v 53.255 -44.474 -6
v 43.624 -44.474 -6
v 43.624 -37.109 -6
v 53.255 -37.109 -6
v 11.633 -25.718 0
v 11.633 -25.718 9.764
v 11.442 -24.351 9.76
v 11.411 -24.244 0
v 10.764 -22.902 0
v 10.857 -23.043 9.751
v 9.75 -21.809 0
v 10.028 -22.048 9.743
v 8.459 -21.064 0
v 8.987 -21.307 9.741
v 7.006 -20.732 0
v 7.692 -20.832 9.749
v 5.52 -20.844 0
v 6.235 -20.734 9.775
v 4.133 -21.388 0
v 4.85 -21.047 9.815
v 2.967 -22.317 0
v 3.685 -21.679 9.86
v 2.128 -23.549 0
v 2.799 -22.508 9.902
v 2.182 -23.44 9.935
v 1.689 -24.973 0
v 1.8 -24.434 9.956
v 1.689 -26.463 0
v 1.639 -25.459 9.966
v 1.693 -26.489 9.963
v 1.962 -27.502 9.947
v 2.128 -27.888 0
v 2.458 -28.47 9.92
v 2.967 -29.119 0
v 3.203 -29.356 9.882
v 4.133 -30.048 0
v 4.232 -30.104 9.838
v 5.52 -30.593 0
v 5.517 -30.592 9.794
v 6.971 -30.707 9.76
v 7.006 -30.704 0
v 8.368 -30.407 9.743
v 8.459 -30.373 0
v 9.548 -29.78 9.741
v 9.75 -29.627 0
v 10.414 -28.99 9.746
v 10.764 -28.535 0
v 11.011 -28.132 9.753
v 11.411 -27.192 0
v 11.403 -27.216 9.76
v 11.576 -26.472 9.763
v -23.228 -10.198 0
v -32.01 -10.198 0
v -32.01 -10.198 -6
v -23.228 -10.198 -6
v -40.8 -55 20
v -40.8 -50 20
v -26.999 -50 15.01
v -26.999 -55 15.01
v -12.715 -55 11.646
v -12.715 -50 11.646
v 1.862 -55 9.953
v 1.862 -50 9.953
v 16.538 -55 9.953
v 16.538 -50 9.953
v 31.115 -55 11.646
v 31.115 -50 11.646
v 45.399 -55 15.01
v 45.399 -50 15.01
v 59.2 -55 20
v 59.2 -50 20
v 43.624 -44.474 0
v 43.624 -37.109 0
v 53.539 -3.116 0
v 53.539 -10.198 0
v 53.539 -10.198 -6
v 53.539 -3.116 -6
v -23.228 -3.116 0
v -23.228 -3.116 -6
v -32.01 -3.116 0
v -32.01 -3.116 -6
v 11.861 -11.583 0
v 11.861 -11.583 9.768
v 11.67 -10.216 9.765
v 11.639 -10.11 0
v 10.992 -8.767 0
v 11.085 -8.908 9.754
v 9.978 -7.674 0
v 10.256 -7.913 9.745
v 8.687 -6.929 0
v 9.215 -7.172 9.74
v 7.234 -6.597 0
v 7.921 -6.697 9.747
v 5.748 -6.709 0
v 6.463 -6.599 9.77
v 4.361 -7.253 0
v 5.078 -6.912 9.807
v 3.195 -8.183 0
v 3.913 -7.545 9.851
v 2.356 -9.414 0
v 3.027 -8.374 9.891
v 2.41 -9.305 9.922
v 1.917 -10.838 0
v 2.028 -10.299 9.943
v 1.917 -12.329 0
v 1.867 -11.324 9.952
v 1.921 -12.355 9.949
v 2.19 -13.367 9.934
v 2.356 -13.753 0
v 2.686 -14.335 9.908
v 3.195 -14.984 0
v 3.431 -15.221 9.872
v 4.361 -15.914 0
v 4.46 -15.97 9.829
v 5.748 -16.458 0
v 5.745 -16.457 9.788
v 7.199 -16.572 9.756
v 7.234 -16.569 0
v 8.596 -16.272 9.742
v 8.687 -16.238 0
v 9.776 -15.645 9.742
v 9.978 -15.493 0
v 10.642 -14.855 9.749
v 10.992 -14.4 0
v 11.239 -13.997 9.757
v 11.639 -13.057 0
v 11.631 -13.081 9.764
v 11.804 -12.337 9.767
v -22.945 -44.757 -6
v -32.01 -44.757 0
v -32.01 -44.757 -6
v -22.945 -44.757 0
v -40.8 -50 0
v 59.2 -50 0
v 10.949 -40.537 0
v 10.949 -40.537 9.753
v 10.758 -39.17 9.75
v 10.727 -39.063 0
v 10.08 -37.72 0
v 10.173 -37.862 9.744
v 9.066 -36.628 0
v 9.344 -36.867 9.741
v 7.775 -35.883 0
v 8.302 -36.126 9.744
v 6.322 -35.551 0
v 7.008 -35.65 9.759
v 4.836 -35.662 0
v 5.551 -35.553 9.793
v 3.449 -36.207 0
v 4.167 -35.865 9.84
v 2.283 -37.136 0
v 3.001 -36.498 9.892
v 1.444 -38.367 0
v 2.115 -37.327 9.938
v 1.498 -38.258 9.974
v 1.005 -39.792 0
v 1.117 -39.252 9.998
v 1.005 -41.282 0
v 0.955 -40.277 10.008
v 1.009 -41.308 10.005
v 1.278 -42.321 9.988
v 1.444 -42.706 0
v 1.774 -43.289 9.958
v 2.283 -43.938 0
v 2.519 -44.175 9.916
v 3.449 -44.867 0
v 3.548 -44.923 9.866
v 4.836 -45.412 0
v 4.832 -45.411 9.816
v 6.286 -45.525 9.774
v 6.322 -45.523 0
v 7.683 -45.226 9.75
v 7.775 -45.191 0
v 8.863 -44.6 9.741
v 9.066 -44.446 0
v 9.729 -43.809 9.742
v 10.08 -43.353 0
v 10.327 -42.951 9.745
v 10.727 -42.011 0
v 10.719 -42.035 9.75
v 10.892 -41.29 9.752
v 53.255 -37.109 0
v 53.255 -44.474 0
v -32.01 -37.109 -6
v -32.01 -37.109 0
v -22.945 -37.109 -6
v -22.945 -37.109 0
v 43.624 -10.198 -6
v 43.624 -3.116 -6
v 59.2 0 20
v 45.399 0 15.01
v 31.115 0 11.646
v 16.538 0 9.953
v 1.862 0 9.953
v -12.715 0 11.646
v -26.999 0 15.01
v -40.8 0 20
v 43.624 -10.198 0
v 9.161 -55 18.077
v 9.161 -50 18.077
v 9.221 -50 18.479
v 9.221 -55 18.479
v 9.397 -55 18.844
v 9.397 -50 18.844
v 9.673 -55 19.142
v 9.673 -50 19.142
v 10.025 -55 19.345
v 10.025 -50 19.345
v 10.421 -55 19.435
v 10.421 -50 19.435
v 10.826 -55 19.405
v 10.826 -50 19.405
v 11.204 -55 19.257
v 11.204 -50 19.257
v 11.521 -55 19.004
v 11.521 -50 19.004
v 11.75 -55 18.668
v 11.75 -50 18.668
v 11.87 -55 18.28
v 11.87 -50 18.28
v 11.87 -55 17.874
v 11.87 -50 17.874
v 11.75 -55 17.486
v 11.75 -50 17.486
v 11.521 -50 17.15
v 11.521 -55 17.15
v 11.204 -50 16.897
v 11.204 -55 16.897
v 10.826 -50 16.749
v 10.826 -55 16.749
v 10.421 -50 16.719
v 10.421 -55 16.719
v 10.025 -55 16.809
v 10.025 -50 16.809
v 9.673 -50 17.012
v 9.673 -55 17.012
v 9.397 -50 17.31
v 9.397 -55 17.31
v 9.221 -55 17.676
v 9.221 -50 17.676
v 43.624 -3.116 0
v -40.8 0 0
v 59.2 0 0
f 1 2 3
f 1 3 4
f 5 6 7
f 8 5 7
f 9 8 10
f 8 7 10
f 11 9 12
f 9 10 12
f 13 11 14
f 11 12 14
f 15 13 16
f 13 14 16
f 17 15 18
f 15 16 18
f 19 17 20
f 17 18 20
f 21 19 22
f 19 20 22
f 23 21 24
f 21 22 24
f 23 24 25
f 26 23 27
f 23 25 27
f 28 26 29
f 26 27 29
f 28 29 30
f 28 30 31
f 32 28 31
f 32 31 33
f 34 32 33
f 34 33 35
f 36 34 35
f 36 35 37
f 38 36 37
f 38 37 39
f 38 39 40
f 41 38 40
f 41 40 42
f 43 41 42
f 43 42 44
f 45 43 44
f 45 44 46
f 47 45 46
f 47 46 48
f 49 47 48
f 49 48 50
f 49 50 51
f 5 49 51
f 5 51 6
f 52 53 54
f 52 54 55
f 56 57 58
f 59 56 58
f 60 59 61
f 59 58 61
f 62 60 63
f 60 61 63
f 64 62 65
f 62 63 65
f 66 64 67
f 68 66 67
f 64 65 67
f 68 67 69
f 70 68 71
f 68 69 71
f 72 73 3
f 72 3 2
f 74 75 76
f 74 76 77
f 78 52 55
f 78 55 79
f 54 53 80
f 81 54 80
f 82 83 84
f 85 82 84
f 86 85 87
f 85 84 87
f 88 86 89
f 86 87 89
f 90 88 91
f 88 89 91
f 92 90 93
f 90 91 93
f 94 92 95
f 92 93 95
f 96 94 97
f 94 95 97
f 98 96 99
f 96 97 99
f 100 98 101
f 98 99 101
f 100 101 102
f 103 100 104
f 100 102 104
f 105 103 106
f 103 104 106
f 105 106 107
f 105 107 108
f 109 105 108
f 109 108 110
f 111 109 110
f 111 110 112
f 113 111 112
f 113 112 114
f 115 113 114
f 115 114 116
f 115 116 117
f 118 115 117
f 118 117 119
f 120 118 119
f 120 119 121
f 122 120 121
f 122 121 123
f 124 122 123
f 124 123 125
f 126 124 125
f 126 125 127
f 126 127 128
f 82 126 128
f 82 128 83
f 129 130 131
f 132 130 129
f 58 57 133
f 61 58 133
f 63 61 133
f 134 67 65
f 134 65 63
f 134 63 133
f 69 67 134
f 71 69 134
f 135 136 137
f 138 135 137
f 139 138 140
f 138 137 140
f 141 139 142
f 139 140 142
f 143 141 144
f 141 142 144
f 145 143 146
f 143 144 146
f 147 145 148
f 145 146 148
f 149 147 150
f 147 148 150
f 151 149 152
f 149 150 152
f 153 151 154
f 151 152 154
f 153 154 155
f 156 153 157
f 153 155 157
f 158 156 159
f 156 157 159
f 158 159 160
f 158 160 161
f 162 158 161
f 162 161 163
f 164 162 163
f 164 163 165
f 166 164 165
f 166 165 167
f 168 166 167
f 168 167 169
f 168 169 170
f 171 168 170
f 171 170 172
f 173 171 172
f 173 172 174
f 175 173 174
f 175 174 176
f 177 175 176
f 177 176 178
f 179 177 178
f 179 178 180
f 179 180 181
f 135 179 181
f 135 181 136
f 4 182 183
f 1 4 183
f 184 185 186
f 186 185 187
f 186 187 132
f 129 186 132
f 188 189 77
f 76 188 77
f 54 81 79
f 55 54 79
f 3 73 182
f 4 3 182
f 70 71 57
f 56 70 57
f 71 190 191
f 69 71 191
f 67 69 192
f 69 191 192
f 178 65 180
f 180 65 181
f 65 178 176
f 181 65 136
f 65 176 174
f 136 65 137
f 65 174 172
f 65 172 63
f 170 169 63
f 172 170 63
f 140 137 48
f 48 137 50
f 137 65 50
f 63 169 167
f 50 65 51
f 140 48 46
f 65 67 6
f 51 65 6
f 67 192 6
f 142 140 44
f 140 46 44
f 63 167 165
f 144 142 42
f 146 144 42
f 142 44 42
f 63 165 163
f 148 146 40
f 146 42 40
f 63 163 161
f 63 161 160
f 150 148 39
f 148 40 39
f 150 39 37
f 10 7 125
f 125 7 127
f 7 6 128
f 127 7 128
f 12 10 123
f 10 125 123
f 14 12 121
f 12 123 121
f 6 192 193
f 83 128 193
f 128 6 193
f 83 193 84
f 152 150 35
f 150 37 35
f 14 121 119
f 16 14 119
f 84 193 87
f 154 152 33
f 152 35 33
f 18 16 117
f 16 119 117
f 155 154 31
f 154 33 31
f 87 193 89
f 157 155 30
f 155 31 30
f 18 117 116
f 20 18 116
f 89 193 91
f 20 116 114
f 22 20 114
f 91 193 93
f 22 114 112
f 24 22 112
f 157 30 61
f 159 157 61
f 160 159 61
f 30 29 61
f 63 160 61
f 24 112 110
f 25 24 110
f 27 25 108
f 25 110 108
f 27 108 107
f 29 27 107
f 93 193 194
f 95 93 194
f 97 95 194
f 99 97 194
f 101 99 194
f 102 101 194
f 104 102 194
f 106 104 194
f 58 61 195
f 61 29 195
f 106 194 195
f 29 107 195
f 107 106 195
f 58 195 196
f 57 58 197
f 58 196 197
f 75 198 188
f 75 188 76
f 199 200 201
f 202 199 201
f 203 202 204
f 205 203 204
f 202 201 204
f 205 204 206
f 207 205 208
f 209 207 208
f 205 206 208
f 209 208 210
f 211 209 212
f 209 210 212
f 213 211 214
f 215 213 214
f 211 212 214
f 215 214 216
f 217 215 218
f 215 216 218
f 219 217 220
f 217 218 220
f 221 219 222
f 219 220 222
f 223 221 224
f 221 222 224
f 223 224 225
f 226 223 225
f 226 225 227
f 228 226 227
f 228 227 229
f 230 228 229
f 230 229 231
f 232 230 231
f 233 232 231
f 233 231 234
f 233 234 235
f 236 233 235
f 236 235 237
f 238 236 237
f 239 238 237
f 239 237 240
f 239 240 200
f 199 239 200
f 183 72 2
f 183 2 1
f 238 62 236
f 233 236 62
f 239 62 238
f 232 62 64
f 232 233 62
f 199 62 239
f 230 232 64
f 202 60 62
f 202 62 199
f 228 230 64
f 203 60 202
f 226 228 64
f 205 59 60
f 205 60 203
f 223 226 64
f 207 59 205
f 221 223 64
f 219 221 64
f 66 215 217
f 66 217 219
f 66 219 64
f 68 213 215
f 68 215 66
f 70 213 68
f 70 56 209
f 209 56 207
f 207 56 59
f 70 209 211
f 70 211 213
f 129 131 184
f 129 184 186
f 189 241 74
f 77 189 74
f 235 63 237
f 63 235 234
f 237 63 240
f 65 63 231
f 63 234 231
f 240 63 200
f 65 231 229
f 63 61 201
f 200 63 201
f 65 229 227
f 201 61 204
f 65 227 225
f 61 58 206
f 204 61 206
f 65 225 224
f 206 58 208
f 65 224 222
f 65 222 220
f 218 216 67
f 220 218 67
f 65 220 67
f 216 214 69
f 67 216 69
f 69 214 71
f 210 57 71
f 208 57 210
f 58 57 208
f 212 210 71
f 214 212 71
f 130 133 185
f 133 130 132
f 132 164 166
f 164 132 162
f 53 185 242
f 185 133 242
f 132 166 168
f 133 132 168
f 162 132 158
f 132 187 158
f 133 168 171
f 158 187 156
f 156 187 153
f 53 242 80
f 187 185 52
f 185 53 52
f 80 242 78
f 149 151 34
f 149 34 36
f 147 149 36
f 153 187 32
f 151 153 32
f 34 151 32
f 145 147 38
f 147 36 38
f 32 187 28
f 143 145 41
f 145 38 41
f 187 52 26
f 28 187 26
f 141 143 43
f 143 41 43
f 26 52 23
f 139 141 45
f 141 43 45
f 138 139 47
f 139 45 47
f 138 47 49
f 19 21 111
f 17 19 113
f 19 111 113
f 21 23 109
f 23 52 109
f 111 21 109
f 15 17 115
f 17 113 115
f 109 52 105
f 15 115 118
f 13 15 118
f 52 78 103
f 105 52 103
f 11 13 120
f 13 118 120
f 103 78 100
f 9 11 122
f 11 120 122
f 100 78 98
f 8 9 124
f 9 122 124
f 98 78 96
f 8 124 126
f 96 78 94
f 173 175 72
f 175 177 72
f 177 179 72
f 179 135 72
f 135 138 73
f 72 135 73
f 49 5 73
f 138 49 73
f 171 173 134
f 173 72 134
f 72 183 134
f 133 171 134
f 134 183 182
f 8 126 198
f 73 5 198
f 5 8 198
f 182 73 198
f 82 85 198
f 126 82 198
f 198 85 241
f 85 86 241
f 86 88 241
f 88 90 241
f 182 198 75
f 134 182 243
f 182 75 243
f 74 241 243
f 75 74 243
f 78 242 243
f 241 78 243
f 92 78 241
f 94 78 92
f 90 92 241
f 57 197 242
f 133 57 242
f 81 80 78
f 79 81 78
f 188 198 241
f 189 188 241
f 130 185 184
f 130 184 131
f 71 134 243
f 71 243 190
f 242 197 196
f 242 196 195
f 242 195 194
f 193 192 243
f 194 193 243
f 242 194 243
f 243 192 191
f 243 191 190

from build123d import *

# Parameters (mm, degrees)
F1_DEPTH  = 50
F2_R      = 5
F3_DEPTH  = 25
F3_FACE_R = 5
F4_DEPTH  = 143
F5_DEPTH  = 25.0010001
F6_W      = 7.0818345994
F6_H      = 5.9487447143
F7_DEPTH  = 6
F6_W_2    = 9.9145658314
F6_H_2    = 7.0818341337
F6_W_3    = 8.7814740837
F11_DEPTH = 5
F12_R     = 1.2416871231
F13_DEPTH = 146
F14_R     = 1.3622183524
F15_DEPTH = 33.4
F16_W     = 9.0647470206
F16_H     = 7.6483786106
F16_W_2   = 9.6312910318
F16_H_2   = 7.3651075363
F17_DEPTH = 6


# Not quite as in the source:
# - an extrude ends at something that could not be found from the text; its depth is read off the source's solid


with BuildPart() as f1:
    # F0 (on Front) → F1 (new body)
    with BuildSketch(Plane.XZ):
        with BuildLine():
            Line((-40.7999969139, 20), (-40.7999969139, 0))
            Line((-40.7999969139, 0), (59.2000030861, 0))
            Line((59.2000030861, 0), (59.2000030861, 20))
            ThreePointArc((59.2000030861, 20), (9.2000030861, 9.7404933021), (-40.7999969139, 20))
        make_face()
    extrude(amount=F1_DEPTH)

    # F2 (on Top) → F3 (join)
    with BuildSketch(Plane.XY):
        with Locations((6.8606630445, -11.5833937097)):
            Circle(F2_R)
        with Locations((6.6326826697, -25.7181784424)):
            Circle(F2_R)
        with Locations((5.9487419203, -40.5368994273)):
            Circle(F2_R)
    extrude(amount=F3_DEPTH)

    # F2 (on Top) + F3_face (on face) → F4 (cut, through all)
    with BuildSketch(Plane.XY):
        with Locations((6.8606630445, -11.5833937097)):
            Circle(F2_R)
        with Locations((6.6326826697, -25.7181784424)):
            Circle(F2_R)
        with Locations((5.9487419203, -40.5368994273)):
            Circle(F2_R)
    with BuildSketch(Plane(origin=(6.6326826697, -25.7181784424, 25), x_dir=(1, 0, 0), z_dir=(0, 0, 1))):
        Circle(F3_FACE_R)
        with Locations((-0.6839407494, -14.8187209849)):
            Circle(F3_FACE_R)
    extrude(amount=-F4_DEPTH, mode=Mode.SUBTRACT)

    # F5 (cut, through all): a face of the model
    f5_faces = [f1.faces().sort_by_distance(p)[0] for p in [
        (6.8606630445, -11.5833937097, 25),
    ]]
    extrude(f5_faces, amount=-F5_DEPTH, mode=Mode.SUBTRACT)

    # F6 (on Top) → F7, piece 3 (join)
    with BuildSketch(Plane.XY):
        with Locations((48.581385985, -6.6569244955)):
            Rectangle(F6_W_2, F6_H_2)
        with Locations((-27.6191551238, -6.6569244955)):
            Rectangle(F6_W_3, F6_H_2)
    extrude(amount=-F7_DEPTH)

    # F12 (on Front) → F13 (cut, through all)
    with BuildSketch(Plane.XZ):
        with Locations((3.8911467418, 17.7770014852)):
            Circle(F12_R)
    extrude(amount=-F13_DEPTH, mode=Mode.SUBTRACT)

    # F16 (on face) → F17 (join)
    with BuildSketch(Plane(origin=(0, 0, 0), x_dir=(1, 0, 0), z_dir=(0, 0, -1))):
        with Locations((-27.4775186554, 40.9330055118)):
            Rectangle(F16_W, F16_H)
        with Locations((48.4397485852, 40.7913699746)):
            Rectangle(F16_W_2, F16_H_2)
    extrude(amount=F17_DEPTH)


with BuildPart() as f7:
    # F6 (on Top) → F7 (new body)
    with BuildSketch(Plane.XY):
        with Locations((-26.7693353817, -55.3799495101)):
            Rectangle(F6_W, F6_H)
    extrude(amount=-F7_DEPTH)


with BuildPart() as f7b:
    # F6 (on Top) → F7, piece 2 (new body)
    with BuildSketch(Plane.XY):
        with Locations((48.581385985, -55.3799495101)):
            Rectangle(F6_W_2, F6_H)
    extrude(amount=-F7_DEPTH)


with BuildPart() as f11:
    # F10 (on face) → F11 (new body)
    with BuildSketch(Plane.XZ.offset(50)):
        with BuildLine():
            Line((59.2000030861, 20), (-40.7999969139, 20))
            ThreePointArc((-40.7999969139, 20), (9.2000030861, 9.7404933021), (59.2000030861, 20))
        make_face()
    extrude(amount=F11_DEPTH)

    # F14 (on face) → F15 (cut)
    with BuildSketch(Plane(origin=(0, -50, 0), x_dir=(-1, 0, 0), z_dir=(0, 1, 0))):
        with Locations((-10.5227353051, 18.0770270526)):
            Circle(F14_R)
    extrude(amount=-F15_DEPTH, mode=Mode.SUBTRACT)


solid = Compound([f1.part, f11.part])
